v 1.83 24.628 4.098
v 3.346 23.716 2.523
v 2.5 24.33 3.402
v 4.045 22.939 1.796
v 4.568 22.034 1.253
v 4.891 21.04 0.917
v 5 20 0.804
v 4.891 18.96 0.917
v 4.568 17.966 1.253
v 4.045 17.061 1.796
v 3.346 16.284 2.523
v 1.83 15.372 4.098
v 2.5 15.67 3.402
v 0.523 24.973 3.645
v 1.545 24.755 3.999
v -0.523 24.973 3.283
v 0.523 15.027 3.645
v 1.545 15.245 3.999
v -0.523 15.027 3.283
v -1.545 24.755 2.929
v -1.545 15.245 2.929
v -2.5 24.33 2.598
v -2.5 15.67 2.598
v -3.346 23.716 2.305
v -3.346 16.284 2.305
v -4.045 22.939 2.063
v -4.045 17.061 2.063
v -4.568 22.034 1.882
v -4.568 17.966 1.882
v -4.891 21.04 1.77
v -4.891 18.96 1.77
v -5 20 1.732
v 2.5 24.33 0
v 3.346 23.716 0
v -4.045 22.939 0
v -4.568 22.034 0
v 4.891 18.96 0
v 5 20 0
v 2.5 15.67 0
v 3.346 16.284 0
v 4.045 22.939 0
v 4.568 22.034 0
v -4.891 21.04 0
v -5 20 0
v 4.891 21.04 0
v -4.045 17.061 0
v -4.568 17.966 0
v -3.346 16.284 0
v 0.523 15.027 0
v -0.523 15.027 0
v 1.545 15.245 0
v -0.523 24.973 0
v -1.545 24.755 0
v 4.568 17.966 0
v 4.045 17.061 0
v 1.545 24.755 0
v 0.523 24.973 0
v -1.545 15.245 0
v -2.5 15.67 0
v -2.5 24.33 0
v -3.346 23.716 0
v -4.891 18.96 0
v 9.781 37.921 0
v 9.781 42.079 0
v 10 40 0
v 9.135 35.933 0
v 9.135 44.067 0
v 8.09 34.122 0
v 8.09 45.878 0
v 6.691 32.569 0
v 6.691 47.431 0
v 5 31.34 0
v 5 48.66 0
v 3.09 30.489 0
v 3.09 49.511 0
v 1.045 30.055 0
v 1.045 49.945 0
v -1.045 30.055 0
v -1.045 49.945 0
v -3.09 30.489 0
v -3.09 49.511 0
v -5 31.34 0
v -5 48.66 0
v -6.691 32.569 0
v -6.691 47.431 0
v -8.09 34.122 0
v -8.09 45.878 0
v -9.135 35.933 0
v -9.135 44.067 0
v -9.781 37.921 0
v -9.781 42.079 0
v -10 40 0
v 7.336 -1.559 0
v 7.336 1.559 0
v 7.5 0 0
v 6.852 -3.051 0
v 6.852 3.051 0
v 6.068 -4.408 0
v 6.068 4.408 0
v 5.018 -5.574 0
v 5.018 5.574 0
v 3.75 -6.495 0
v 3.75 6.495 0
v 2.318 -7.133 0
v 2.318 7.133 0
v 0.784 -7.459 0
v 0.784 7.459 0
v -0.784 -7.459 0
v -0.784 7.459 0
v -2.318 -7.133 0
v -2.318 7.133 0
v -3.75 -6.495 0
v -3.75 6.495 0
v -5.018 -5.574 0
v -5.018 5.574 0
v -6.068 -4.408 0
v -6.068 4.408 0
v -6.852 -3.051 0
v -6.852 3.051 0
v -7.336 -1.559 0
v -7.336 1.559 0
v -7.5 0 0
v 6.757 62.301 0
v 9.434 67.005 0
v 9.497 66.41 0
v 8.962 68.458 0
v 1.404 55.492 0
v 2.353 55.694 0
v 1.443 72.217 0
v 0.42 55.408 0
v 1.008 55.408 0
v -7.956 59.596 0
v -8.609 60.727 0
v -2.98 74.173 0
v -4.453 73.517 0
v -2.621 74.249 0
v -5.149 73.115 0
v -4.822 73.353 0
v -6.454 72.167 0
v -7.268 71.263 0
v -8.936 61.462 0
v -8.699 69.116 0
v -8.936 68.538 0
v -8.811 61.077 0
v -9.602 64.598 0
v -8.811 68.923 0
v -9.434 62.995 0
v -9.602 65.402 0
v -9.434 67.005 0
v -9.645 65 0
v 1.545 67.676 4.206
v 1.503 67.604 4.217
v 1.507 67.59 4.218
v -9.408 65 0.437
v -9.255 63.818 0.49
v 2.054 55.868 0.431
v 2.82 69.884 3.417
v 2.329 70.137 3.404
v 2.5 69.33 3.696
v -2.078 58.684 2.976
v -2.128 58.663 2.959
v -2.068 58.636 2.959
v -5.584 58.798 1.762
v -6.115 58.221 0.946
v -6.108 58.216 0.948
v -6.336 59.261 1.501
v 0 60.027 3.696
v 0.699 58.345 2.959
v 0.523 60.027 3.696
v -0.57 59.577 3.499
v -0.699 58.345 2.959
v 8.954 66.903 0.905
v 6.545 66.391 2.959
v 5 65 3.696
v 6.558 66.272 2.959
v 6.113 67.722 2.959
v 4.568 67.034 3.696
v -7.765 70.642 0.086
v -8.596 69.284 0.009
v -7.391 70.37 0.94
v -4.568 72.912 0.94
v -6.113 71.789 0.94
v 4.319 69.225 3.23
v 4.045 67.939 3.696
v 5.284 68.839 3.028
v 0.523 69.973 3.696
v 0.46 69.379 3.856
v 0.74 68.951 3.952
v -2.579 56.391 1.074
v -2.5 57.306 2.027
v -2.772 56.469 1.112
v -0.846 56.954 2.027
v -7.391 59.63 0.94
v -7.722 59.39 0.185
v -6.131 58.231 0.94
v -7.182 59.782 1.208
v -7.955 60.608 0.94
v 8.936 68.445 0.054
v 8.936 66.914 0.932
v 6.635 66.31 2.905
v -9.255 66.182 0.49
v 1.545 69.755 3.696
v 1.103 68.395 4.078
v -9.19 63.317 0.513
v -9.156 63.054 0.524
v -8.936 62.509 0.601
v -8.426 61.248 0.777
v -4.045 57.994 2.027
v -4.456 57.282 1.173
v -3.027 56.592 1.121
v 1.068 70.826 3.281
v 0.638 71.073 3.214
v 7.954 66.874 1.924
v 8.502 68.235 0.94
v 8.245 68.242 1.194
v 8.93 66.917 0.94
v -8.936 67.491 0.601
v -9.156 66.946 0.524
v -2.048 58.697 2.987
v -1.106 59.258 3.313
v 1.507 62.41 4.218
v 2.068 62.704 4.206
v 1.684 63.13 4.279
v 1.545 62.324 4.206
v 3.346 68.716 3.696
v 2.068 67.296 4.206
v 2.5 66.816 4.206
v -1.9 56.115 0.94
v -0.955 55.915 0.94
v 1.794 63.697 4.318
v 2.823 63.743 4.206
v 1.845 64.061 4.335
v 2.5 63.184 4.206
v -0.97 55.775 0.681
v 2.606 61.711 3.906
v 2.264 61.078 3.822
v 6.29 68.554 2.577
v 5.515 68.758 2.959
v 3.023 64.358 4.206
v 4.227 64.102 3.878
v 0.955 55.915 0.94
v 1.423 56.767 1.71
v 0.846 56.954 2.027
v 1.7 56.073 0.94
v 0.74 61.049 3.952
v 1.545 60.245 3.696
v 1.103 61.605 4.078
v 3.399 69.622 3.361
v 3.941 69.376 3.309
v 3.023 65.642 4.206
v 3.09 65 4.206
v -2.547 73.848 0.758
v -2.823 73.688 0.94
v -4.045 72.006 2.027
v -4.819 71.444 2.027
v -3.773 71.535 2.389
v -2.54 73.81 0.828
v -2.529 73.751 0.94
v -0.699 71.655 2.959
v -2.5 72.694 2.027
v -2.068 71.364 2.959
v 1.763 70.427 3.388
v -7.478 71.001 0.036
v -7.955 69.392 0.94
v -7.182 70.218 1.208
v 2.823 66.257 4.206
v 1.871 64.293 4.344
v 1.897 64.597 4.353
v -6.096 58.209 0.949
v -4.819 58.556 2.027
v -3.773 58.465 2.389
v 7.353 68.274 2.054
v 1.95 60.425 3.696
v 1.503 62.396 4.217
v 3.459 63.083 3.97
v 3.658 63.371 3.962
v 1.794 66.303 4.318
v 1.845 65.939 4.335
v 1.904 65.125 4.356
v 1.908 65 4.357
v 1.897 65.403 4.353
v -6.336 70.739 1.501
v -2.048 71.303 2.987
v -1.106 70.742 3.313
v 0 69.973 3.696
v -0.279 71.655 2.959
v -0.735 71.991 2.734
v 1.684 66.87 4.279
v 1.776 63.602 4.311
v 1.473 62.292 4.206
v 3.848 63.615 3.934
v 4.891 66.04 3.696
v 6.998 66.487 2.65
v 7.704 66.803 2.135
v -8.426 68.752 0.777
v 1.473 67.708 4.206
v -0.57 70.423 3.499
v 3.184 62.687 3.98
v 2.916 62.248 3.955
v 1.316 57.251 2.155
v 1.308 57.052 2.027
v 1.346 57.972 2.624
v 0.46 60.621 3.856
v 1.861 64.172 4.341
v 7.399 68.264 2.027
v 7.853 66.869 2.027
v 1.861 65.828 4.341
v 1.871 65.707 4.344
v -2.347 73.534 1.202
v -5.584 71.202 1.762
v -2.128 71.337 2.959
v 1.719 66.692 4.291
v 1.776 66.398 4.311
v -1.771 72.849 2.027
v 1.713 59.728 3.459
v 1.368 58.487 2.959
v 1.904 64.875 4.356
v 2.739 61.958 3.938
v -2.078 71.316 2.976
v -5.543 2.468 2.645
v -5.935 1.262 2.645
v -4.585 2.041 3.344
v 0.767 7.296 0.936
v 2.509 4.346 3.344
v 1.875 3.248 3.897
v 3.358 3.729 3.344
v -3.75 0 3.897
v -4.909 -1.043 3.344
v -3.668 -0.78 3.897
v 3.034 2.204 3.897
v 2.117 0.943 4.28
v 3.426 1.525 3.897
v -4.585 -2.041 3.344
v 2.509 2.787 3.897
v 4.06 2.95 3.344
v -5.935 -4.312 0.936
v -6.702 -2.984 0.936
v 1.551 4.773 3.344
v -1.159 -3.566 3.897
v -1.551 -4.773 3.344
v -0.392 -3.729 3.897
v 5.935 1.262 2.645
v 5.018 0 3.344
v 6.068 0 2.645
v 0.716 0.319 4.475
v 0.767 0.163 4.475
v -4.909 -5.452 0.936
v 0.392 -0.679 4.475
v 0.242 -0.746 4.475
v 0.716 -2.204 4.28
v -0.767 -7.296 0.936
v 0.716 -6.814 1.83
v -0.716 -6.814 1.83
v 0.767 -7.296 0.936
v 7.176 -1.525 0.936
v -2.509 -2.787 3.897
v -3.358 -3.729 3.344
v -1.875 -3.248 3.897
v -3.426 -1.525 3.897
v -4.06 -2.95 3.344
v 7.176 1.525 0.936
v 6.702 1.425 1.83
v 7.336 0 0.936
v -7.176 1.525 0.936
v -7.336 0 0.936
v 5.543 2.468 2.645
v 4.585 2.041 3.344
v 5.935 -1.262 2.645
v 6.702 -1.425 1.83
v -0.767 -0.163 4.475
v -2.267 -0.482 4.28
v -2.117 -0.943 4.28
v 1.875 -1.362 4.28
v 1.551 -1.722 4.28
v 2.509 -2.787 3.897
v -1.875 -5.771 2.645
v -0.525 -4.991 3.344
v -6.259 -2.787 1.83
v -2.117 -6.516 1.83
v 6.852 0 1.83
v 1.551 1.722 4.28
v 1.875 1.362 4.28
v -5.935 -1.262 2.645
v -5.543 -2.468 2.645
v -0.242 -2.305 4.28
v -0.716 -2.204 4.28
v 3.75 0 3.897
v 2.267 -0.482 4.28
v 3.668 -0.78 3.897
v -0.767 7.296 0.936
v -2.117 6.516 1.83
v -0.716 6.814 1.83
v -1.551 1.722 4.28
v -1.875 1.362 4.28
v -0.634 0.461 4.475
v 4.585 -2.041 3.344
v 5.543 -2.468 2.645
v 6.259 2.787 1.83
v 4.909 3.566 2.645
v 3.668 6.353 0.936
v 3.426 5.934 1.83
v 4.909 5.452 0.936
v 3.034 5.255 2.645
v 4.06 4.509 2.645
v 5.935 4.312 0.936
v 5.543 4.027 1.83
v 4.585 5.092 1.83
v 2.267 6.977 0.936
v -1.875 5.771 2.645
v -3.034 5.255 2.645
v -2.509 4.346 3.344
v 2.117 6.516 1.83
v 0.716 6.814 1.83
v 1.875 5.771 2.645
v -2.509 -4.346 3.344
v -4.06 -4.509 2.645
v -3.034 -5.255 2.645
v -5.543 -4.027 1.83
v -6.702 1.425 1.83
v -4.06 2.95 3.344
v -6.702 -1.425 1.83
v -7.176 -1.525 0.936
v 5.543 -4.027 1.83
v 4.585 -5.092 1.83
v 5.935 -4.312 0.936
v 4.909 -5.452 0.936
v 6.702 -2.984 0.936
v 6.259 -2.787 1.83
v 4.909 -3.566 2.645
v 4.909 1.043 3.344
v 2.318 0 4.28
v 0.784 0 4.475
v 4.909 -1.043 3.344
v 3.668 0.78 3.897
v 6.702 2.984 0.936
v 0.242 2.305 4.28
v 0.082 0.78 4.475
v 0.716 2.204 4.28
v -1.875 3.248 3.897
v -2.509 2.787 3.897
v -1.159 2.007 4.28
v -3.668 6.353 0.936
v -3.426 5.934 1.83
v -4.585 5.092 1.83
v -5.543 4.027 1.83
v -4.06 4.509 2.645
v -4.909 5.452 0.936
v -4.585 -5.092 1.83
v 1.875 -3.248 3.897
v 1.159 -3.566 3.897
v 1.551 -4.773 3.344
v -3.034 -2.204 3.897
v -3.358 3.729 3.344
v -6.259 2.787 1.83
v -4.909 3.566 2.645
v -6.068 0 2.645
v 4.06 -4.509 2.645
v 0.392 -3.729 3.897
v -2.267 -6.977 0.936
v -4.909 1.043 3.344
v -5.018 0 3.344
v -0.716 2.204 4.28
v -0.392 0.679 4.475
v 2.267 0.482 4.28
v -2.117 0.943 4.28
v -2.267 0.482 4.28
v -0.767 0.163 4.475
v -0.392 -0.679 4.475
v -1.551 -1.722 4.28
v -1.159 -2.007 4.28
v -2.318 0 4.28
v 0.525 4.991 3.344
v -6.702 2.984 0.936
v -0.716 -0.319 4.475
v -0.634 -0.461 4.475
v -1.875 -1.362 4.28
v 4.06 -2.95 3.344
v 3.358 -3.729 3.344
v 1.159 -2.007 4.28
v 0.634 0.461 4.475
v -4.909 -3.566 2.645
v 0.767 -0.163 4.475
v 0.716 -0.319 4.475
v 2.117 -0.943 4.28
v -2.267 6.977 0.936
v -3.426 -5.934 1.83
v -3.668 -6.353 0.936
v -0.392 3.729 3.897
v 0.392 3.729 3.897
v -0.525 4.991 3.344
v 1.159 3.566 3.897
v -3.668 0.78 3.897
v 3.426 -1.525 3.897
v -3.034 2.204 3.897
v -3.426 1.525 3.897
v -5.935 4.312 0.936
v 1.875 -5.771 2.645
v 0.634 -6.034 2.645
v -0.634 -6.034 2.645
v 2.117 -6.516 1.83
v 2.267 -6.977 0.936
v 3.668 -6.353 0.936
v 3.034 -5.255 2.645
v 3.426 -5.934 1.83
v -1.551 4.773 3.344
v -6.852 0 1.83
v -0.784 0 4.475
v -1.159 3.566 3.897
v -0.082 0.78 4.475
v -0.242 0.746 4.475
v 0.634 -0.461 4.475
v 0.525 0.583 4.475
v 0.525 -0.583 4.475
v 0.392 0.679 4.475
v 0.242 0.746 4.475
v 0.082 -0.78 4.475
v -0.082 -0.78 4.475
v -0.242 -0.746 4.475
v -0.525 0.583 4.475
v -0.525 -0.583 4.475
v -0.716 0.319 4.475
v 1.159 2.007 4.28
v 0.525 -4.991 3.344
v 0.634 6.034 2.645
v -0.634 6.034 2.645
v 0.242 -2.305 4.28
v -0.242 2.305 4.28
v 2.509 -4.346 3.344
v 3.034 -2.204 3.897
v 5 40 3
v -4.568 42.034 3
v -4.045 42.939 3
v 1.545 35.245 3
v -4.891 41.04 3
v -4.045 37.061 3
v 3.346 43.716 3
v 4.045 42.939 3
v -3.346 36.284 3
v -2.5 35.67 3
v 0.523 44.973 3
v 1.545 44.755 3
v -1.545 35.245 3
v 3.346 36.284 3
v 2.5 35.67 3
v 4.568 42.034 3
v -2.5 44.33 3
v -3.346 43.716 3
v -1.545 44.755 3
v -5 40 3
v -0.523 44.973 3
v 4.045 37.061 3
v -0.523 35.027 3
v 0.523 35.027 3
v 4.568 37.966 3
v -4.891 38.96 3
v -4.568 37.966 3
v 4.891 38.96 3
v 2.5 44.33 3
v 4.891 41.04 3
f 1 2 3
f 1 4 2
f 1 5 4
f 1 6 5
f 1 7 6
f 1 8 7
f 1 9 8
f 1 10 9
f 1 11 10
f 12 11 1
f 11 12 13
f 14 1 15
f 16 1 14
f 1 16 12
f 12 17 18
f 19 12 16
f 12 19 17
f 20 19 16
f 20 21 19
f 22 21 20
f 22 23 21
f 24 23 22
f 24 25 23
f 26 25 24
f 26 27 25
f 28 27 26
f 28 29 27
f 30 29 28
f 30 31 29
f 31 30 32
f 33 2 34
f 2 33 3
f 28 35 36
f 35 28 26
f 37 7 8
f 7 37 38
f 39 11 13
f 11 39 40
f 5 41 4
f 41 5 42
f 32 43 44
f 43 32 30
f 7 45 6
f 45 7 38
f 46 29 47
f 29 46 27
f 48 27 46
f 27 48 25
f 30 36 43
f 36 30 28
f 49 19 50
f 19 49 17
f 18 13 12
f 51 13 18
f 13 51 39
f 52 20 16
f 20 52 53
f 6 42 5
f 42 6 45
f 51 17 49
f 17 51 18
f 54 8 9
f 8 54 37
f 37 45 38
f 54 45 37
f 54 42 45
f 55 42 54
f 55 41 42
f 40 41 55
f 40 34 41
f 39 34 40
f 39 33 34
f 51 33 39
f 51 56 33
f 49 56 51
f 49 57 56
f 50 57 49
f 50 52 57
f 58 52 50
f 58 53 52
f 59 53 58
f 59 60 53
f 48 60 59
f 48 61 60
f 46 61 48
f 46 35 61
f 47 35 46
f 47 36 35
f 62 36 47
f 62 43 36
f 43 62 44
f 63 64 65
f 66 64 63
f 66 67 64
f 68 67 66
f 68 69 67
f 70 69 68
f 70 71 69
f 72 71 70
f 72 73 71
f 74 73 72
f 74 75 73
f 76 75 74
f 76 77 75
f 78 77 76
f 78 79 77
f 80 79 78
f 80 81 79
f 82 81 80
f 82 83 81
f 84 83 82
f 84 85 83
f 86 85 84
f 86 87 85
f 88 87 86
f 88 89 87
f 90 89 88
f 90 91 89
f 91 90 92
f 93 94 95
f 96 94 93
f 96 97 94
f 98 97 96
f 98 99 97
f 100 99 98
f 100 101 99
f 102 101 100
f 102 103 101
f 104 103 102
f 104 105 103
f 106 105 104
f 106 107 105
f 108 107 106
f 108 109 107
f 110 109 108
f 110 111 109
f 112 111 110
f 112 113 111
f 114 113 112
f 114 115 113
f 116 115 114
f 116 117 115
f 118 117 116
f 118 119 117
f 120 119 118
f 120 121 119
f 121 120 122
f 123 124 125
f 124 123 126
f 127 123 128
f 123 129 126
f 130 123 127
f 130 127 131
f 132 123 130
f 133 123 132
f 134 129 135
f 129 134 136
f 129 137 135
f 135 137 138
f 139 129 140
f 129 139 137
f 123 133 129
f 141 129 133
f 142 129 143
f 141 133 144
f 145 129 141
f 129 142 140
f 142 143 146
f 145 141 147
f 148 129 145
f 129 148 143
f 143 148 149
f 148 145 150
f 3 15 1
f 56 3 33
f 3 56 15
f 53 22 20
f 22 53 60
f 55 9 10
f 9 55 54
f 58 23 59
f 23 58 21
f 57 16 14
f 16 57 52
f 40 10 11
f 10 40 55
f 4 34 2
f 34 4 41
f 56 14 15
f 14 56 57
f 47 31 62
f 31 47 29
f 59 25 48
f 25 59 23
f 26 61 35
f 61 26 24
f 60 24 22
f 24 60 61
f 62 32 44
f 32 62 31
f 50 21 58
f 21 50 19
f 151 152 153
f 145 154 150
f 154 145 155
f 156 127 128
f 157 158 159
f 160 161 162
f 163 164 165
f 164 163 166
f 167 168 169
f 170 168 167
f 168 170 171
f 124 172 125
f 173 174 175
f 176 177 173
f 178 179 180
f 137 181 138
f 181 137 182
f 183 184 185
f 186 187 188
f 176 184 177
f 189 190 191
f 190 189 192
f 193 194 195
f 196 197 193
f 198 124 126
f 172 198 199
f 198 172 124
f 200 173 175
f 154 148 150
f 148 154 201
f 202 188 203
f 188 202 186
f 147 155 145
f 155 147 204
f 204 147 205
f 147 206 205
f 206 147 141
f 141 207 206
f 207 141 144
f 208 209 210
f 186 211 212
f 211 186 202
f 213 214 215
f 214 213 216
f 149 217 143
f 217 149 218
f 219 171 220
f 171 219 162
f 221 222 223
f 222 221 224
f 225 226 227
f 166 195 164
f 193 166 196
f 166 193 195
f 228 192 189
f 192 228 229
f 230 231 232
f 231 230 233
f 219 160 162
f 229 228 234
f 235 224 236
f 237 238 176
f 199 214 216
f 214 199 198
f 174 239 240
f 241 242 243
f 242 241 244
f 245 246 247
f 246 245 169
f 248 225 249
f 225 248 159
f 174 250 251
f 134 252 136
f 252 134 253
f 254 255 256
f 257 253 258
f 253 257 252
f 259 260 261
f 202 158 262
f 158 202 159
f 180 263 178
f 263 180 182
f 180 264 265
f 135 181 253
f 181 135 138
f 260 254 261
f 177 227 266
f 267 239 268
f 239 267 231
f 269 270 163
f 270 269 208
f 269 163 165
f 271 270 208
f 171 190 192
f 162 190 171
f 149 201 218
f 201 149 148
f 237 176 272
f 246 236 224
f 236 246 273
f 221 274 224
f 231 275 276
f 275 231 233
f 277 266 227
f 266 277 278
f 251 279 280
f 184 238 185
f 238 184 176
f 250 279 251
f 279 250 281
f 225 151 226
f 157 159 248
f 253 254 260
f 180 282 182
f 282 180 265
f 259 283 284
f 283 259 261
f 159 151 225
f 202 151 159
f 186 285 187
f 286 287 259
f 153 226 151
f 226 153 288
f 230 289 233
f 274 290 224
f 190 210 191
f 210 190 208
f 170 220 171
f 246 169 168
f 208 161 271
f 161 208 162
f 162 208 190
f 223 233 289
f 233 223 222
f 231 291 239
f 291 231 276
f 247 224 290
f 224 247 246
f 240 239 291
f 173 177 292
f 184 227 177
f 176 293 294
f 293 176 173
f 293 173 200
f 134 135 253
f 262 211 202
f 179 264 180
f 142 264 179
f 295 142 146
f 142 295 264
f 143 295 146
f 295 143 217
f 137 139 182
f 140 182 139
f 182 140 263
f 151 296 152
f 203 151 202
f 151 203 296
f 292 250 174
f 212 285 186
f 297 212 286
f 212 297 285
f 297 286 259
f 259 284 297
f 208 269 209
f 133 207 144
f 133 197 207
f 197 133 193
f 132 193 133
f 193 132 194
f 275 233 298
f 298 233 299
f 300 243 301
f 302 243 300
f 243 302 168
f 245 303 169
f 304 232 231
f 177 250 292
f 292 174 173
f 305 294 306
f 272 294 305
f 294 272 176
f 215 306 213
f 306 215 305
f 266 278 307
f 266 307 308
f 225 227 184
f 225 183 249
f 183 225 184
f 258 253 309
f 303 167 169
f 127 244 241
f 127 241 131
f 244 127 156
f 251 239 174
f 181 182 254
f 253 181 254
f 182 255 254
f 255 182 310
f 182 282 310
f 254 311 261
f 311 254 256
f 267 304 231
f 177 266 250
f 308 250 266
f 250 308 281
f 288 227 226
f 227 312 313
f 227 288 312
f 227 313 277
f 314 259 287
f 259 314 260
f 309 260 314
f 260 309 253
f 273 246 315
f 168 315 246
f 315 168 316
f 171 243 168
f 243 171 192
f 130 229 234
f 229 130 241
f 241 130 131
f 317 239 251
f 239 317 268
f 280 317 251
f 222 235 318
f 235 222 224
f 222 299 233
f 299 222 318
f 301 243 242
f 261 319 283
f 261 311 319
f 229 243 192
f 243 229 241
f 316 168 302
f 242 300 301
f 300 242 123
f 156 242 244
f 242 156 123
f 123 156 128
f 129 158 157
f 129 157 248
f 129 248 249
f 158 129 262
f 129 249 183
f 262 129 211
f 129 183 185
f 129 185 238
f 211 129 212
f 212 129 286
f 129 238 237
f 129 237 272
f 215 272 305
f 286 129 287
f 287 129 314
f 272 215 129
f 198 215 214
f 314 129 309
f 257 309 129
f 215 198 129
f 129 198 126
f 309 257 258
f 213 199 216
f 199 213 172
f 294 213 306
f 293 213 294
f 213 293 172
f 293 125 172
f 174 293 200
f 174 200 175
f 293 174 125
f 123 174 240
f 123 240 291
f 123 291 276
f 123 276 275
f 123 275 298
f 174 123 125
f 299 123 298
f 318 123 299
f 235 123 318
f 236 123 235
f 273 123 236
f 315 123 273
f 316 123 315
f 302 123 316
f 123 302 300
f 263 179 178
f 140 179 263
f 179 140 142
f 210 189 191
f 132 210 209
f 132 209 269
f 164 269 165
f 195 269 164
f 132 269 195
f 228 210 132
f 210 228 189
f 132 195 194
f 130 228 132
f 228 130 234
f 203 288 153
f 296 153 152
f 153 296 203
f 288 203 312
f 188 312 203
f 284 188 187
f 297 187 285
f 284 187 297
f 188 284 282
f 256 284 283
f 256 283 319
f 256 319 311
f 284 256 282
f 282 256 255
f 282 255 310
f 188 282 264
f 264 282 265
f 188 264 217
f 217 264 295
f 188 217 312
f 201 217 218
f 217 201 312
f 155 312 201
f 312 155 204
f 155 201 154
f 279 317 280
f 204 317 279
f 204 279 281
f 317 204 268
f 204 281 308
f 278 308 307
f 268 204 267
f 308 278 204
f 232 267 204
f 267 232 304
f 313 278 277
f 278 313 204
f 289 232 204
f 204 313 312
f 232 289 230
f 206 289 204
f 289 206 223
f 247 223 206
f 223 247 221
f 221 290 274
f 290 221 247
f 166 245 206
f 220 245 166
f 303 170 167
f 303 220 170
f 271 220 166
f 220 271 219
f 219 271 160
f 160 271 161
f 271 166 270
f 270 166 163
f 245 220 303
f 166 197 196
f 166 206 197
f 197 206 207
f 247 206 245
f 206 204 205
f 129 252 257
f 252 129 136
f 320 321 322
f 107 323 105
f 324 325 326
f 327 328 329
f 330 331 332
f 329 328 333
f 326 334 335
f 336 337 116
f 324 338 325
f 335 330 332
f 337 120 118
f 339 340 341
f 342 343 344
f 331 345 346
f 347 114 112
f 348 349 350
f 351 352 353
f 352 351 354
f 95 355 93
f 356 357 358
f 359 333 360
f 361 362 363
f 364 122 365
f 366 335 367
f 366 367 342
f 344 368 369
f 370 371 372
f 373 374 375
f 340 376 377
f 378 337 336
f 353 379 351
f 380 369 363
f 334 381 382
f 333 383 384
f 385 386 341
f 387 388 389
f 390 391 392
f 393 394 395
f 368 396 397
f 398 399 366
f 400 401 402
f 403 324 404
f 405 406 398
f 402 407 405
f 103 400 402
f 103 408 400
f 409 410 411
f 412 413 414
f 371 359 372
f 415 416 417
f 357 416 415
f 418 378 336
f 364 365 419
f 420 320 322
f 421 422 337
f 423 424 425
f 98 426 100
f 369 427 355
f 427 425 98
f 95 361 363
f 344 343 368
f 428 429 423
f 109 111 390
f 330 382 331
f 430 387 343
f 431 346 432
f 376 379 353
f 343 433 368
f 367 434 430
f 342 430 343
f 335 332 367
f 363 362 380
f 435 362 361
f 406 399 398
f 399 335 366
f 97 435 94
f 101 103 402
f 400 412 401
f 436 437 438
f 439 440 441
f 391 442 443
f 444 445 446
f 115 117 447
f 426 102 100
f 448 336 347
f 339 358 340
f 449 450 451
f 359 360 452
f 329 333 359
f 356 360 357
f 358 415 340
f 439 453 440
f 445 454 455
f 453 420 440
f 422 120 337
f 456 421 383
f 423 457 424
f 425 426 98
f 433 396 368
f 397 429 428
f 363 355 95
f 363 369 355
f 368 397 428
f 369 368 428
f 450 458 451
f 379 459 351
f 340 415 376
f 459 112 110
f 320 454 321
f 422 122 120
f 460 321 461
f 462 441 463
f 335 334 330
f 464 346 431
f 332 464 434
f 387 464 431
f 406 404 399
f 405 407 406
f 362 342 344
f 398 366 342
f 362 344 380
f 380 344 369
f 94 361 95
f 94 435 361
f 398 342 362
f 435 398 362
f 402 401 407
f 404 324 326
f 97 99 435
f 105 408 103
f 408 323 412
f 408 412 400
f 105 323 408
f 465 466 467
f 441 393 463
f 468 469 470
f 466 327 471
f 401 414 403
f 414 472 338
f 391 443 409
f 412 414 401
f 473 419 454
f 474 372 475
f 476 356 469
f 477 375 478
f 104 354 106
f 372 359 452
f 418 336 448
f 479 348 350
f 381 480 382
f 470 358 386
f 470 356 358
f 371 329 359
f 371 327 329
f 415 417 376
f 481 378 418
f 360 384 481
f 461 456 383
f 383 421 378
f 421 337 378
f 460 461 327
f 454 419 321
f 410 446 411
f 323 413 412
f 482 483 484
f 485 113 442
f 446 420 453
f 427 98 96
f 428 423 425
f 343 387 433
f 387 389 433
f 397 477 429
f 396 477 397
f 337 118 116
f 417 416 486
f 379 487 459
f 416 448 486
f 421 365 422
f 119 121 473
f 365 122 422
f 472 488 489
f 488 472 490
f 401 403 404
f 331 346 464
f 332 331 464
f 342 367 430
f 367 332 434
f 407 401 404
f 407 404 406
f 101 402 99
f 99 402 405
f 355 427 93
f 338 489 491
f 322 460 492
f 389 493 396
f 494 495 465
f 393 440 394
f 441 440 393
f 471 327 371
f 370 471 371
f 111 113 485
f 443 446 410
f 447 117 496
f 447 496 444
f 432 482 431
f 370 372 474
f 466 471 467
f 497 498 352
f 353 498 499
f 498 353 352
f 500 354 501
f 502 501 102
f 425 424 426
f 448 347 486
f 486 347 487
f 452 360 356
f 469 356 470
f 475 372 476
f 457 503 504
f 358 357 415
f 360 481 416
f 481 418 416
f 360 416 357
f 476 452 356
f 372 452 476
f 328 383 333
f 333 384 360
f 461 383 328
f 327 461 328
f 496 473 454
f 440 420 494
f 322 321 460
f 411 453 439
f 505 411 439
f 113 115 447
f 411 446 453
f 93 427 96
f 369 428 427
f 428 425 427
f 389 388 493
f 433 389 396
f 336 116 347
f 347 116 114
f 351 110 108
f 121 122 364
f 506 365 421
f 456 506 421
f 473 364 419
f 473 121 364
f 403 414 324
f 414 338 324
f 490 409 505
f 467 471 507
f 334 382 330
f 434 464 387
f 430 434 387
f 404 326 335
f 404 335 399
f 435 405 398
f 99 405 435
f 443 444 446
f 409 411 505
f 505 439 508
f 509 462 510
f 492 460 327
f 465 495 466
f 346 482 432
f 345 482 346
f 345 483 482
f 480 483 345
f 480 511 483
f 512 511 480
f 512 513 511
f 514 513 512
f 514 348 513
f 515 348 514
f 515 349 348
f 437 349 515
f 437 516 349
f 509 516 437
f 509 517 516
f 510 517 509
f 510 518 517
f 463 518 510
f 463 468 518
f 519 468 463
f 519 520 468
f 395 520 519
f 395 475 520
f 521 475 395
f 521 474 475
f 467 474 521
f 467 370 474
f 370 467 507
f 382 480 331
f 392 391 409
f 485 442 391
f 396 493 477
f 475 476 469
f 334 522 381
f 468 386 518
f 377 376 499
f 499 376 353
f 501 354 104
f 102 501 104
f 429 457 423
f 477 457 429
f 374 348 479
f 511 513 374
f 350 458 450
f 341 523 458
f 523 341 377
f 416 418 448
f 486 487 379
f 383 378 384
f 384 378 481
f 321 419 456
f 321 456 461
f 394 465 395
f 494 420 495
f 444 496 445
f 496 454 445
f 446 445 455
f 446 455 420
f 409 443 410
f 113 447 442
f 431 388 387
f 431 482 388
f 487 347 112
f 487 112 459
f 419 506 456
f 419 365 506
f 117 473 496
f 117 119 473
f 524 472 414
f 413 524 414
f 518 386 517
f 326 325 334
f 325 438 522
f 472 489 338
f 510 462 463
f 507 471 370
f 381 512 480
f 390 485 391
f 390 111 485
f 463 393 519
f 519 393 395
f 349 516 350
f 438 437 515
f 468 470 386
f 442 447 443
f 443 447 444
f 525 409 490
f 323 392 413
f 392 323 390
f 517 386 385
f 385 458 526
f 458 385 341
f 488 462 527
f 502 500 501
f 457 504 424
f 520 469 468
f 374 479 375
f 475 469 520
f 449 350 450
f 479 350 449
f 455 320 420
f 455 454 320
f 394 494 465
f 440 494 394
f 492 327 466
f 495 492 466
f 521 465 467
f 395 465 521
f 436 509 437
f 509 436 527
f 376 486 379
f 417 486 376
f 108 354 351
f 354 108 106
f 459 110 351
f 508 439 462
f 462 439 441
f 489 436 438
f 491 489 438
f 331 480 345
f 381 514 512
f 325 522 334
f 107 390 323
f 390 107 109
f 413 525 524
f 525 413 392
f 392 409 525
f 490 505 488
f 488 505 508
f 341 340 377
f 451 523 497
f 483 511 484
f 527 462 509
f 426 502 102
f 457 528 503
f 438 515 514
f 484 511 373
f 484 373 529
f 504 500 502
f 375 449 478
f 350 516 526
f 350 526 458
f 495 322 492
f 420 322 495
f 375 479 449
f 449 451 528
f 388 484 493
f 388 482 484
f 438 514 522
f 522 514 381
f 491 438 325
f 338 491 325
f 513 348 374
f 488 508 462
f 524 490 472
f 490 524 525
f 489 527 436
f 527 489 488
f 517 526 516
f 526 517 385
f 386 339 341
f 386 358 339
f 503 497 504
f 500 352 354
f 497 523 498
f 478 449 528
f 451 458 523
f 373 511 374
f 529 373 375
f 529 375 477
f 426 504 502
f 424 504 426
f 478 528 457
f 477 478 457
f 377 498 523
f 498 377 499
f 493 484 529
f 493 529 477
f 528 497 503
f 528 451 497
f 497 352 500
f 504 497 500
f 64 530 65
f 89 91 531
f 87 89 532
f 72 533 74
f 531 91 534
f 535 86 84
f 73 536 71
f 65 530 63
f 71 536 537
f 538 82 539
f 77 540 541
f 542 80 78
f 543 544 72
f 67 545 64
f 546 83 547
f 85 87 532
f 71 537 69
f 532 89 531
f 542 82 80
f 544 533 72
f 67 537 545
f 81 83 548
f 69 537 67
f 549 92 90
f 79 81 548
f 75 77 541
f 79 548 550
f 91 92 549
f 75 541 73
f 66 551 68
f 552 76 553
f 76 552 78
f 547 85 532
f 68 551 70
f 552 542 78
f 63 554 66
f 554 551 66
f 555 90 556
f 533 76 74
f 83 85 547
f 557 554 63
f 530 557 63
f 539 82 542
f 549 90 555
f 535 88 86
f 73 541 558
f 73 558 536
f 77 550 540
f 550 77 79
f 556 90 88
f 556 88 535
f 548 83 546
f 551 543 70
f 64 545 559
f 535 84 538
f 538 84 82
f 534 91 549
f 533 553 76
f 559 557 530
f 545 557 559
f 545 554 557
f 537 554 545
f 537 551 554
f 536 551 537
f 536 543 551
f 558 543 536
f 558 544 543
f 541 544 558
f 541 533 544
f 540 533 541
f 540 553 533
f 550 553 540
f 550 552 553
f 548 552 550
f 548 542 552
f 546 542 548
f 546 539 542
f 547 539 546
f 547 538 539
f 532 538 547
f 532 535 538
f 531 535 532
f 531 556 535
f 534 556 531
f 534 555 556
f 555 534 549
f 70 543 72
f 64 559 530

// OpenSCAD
// example scene for camelot

module scene() {
    sphere(r=15, center=true);
    translate(v=[0,80,5]) cylinder(h = 10, r1 = 20, r2 = 10, center = true);
    translate(v=[0,40,15]) {
      intersection() {
        translate([0,0,-15]) rotate([60,0,90]) cube([30, 20, 20], center=true);
        cylinder(h = 30, r = 10, center = true);
      }
    }
    translate([0,130,-5]) {
      intersection() {
        sphere(20, center=true);
        rotate([30,60,0]) cube(30, center=true);
      }
    }
}

// remove the parts of the objects below the zero plane
difference() {
  scale([0.5, 0.5, 0.3]) scene();
  translate([0,0,-20]) cube([200,200,40], center=true);
}
